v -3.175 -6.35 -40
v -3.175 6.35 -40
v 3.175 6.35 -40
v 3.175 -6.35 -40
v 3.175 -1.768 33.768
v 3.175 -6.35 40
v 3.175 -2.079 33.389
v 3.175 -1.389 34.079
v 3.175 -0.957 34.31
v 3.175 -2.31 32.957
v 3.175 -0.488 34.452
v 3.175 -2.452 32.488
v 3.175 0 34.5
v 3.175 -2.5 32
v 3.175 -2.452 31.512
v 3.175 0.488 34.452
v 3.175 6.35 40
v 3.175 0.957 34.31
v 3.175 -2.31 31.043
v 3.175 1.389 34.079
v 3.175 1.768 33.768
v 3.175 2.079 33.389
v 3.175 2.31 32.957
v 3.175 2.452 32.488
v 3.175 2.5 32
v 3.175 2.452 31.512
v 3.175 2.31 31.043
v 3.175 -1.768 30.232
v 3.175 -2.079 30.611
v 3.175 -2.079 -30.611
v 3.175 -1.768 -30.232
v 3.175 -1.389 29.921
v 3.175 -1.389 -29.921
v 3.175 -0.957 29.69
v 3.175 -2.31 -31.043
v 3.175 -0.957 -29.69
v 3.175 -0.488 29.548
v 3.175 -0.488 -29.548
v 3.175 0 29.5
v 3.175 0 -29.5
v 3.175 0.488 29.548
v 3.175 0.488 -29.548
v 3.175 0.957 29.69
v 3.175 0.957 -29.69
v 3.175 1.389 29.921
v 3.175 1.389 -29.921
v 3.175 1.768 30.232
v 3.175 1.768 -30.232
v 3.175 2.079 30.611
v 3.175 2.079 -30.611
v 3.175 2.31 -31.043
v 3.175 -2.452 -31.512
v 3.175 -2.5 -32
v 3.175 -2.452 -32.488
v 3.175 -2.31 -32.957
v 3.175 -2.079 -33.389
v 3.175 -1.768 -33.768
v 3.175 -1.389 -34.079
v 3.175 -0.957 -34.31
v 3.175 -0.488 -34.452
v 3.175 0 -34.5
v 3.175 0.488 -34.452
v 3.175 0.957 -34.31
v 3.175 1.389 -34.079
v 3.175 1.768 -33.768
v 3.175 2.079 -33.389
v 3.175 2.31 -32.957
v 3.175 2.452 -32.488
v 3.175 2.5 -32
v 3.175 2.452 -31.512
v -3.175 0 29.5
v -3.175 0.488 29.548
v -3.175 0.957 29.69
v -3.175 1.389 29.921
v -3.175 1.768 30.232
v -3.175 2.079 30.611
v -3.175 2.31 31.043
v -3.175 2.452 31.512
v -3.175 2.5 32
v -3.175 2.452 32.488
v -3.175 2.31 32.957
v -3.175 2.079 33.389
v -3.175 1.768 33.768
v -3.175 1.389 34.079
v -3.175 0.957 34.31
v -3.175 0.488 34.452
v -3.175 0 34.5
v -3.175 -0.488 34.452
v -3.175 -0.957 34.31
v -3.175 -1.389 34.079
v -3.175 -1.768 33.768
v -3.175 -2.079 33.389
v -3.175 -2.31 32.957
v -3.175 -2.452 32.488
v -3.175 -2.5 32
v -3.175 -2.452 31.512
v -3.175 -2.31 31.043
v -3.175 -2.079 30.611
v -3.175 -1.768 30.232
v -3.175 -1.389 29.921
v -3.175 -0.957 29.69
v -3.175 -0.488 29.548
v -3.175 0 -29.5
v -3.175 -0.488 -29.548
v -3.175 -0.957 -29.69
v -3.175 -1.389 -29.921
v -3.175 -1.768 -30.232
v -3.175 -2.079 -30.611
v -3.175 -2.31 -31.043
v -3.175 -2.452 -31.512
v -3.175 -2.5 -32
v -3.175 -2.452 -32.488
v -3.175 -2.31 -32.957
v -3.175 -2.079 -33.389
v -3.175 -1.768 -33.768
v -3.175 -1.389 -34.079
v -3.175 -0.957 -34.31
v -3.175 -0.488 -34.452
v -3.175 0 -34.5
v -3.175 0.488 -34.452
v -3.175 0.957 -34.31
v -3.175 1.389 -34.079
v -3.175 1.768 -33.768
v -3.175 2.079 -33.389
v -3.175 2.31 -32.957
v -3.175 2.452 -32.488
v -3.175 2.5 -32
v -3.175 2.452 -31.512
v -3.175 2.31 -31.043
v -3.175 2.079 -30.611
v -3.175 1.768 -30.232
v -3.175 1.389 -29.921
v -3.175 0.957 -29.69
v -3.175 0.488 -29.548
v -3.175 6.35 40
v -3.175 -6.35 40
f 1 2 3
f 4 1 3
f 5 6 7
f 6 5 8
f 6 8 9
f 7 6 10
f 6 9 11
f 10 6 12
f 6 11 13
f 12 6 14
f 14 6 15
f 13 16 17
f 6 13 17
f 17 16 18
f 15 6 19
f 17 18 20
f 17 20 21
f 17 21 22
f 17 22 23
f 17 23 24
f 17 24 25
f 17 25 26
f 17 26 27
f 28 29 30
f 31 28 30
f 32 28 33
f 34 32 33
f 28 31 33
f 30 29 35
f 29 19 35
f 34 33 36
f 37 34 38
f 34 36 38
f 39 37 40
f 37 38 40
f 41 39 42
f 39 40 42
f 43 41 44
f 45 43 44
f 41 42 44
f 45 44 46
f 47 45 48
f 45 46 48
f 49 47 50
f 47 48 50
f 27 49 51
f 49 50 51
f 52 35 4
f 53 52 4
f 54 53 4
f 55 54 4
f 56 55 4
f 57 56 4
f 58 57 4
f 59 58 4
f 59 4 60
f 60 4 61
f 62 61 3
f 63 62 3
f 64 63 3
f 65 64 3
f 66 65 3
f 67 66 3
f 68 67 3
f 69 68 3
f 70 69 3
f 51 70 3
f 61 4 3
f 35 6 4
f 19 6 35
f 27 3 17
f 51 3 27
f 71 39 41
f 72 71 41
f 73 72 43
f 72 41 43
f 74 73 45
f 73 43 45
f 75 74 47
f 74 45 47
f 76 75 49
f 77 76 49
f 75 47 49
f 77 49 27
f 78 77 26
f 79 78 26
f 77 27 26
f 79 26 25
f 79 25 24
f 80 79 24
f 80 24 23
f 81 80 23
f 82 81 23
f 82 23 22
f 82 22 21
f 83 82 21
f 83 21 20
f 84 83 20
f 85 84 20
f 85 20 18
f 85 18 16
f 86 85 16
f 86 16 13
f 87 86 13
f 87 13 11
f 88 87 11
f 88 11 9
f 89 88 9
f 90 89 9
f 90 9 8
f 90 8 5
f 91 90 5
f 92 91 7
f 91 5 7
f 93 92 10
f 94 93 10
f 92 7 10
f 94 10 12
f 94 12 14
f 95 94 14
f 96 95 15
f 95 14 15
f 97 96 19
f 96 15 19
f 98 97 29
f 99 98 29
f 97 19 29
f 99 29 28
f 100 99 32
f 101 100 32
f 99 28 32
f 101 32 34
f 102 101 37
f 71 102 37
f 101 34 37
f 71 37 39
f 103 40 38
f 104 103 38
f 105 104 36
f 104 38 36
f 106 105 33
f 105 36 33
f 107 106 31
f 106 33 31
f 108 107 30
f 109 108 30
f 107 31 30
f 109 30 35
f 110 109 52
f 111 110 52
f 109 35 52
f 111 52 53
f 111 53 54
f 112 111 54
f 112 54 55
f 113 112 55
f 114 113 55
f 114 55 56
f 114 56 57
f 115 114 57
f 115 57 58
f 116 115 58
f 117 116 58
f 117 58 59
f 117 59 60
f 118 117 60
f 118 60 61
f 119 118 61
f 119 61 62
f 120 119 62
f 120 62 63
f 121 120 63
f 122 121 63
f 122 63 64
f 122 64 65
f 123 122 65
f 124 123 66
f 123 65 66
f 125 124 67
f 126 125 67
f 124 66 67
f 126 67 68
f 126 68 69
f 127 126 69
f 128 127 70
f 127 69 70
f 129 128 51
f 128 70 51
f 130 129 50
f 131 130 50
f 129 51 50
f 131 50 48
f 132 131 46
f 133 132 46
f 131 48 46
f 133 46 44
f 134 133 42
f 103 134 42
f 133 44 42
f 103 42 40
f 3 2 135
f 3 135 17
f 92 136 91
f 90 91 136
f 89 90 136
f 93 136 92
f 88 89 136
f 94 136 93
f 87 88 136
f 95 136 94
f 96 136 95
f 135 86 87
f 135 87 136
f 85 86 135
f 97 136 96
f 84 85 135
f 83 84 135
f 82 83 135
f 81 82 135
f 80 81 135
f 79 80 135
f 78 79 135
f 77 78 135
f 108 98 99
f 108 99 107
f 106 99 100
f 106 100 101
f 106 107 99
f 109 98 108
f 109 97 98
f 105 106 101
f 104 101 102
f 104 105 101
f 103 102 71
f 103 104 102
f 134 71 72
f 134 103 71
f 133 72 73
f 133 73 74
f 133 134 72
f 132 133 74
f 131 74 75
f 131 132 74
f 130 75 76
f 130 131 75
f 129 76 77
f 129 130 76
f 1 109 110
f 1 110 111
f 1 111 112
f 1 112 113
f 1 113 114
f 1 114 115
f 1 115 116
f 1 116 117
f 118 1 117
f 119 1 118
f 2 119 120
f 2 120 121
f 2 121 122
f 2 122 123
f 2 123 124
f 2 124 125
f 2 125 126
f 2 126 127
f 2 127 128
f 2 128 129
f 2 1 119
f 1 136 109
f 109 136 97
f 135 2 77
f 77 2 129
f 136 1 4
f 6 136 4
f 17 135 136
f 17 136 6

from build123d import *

# Parameters (mm, degrees)
BOSS_EXTRUDE1_DEPTH      = 40
BOSS_EXTRUDE1_DEPTH_BACK = 40
SKETCH2_W                = 6.35
SKETCH2_H                = 12.7
SKETCH4_R                = 2.5
CUT_EXTRUDE1_DEPTH       = 41.995670503


with BuildPart() as part:
    # Sketch2 → Boss-Extrude1 (new, two sides: drawn at the far end of the back side and taken through both)
    with BuildSketch(Plane.XY.offset(-BOSS_EXTRUDE1_DEPTH_BACK)):
        Rectangle(SKETCH2_W, SKETCH2_H)
    extrude(amount=BOSS_EXTRUDE1_DEPTH + BOSS_EXTRUDE1_DEPTH_BACK)

    # Sketch4 → Cut-Extrude1 (cut, through all)
    with BuildSketch(Plane(origin=(3.175, 0, 0), x_dir=(0, 0, -1), z_dir=(1, 0, 0))):
        with Locations((-32, 0)):
            Circle(SKETCH4_R)
        with Locations((32, 0)):
            Circle(SKETCH4_R)
    extrude(amount=-CUT_EXTRUDE1_DEPTH, mode=Mode.SUBTRACT)


solid = part.part
